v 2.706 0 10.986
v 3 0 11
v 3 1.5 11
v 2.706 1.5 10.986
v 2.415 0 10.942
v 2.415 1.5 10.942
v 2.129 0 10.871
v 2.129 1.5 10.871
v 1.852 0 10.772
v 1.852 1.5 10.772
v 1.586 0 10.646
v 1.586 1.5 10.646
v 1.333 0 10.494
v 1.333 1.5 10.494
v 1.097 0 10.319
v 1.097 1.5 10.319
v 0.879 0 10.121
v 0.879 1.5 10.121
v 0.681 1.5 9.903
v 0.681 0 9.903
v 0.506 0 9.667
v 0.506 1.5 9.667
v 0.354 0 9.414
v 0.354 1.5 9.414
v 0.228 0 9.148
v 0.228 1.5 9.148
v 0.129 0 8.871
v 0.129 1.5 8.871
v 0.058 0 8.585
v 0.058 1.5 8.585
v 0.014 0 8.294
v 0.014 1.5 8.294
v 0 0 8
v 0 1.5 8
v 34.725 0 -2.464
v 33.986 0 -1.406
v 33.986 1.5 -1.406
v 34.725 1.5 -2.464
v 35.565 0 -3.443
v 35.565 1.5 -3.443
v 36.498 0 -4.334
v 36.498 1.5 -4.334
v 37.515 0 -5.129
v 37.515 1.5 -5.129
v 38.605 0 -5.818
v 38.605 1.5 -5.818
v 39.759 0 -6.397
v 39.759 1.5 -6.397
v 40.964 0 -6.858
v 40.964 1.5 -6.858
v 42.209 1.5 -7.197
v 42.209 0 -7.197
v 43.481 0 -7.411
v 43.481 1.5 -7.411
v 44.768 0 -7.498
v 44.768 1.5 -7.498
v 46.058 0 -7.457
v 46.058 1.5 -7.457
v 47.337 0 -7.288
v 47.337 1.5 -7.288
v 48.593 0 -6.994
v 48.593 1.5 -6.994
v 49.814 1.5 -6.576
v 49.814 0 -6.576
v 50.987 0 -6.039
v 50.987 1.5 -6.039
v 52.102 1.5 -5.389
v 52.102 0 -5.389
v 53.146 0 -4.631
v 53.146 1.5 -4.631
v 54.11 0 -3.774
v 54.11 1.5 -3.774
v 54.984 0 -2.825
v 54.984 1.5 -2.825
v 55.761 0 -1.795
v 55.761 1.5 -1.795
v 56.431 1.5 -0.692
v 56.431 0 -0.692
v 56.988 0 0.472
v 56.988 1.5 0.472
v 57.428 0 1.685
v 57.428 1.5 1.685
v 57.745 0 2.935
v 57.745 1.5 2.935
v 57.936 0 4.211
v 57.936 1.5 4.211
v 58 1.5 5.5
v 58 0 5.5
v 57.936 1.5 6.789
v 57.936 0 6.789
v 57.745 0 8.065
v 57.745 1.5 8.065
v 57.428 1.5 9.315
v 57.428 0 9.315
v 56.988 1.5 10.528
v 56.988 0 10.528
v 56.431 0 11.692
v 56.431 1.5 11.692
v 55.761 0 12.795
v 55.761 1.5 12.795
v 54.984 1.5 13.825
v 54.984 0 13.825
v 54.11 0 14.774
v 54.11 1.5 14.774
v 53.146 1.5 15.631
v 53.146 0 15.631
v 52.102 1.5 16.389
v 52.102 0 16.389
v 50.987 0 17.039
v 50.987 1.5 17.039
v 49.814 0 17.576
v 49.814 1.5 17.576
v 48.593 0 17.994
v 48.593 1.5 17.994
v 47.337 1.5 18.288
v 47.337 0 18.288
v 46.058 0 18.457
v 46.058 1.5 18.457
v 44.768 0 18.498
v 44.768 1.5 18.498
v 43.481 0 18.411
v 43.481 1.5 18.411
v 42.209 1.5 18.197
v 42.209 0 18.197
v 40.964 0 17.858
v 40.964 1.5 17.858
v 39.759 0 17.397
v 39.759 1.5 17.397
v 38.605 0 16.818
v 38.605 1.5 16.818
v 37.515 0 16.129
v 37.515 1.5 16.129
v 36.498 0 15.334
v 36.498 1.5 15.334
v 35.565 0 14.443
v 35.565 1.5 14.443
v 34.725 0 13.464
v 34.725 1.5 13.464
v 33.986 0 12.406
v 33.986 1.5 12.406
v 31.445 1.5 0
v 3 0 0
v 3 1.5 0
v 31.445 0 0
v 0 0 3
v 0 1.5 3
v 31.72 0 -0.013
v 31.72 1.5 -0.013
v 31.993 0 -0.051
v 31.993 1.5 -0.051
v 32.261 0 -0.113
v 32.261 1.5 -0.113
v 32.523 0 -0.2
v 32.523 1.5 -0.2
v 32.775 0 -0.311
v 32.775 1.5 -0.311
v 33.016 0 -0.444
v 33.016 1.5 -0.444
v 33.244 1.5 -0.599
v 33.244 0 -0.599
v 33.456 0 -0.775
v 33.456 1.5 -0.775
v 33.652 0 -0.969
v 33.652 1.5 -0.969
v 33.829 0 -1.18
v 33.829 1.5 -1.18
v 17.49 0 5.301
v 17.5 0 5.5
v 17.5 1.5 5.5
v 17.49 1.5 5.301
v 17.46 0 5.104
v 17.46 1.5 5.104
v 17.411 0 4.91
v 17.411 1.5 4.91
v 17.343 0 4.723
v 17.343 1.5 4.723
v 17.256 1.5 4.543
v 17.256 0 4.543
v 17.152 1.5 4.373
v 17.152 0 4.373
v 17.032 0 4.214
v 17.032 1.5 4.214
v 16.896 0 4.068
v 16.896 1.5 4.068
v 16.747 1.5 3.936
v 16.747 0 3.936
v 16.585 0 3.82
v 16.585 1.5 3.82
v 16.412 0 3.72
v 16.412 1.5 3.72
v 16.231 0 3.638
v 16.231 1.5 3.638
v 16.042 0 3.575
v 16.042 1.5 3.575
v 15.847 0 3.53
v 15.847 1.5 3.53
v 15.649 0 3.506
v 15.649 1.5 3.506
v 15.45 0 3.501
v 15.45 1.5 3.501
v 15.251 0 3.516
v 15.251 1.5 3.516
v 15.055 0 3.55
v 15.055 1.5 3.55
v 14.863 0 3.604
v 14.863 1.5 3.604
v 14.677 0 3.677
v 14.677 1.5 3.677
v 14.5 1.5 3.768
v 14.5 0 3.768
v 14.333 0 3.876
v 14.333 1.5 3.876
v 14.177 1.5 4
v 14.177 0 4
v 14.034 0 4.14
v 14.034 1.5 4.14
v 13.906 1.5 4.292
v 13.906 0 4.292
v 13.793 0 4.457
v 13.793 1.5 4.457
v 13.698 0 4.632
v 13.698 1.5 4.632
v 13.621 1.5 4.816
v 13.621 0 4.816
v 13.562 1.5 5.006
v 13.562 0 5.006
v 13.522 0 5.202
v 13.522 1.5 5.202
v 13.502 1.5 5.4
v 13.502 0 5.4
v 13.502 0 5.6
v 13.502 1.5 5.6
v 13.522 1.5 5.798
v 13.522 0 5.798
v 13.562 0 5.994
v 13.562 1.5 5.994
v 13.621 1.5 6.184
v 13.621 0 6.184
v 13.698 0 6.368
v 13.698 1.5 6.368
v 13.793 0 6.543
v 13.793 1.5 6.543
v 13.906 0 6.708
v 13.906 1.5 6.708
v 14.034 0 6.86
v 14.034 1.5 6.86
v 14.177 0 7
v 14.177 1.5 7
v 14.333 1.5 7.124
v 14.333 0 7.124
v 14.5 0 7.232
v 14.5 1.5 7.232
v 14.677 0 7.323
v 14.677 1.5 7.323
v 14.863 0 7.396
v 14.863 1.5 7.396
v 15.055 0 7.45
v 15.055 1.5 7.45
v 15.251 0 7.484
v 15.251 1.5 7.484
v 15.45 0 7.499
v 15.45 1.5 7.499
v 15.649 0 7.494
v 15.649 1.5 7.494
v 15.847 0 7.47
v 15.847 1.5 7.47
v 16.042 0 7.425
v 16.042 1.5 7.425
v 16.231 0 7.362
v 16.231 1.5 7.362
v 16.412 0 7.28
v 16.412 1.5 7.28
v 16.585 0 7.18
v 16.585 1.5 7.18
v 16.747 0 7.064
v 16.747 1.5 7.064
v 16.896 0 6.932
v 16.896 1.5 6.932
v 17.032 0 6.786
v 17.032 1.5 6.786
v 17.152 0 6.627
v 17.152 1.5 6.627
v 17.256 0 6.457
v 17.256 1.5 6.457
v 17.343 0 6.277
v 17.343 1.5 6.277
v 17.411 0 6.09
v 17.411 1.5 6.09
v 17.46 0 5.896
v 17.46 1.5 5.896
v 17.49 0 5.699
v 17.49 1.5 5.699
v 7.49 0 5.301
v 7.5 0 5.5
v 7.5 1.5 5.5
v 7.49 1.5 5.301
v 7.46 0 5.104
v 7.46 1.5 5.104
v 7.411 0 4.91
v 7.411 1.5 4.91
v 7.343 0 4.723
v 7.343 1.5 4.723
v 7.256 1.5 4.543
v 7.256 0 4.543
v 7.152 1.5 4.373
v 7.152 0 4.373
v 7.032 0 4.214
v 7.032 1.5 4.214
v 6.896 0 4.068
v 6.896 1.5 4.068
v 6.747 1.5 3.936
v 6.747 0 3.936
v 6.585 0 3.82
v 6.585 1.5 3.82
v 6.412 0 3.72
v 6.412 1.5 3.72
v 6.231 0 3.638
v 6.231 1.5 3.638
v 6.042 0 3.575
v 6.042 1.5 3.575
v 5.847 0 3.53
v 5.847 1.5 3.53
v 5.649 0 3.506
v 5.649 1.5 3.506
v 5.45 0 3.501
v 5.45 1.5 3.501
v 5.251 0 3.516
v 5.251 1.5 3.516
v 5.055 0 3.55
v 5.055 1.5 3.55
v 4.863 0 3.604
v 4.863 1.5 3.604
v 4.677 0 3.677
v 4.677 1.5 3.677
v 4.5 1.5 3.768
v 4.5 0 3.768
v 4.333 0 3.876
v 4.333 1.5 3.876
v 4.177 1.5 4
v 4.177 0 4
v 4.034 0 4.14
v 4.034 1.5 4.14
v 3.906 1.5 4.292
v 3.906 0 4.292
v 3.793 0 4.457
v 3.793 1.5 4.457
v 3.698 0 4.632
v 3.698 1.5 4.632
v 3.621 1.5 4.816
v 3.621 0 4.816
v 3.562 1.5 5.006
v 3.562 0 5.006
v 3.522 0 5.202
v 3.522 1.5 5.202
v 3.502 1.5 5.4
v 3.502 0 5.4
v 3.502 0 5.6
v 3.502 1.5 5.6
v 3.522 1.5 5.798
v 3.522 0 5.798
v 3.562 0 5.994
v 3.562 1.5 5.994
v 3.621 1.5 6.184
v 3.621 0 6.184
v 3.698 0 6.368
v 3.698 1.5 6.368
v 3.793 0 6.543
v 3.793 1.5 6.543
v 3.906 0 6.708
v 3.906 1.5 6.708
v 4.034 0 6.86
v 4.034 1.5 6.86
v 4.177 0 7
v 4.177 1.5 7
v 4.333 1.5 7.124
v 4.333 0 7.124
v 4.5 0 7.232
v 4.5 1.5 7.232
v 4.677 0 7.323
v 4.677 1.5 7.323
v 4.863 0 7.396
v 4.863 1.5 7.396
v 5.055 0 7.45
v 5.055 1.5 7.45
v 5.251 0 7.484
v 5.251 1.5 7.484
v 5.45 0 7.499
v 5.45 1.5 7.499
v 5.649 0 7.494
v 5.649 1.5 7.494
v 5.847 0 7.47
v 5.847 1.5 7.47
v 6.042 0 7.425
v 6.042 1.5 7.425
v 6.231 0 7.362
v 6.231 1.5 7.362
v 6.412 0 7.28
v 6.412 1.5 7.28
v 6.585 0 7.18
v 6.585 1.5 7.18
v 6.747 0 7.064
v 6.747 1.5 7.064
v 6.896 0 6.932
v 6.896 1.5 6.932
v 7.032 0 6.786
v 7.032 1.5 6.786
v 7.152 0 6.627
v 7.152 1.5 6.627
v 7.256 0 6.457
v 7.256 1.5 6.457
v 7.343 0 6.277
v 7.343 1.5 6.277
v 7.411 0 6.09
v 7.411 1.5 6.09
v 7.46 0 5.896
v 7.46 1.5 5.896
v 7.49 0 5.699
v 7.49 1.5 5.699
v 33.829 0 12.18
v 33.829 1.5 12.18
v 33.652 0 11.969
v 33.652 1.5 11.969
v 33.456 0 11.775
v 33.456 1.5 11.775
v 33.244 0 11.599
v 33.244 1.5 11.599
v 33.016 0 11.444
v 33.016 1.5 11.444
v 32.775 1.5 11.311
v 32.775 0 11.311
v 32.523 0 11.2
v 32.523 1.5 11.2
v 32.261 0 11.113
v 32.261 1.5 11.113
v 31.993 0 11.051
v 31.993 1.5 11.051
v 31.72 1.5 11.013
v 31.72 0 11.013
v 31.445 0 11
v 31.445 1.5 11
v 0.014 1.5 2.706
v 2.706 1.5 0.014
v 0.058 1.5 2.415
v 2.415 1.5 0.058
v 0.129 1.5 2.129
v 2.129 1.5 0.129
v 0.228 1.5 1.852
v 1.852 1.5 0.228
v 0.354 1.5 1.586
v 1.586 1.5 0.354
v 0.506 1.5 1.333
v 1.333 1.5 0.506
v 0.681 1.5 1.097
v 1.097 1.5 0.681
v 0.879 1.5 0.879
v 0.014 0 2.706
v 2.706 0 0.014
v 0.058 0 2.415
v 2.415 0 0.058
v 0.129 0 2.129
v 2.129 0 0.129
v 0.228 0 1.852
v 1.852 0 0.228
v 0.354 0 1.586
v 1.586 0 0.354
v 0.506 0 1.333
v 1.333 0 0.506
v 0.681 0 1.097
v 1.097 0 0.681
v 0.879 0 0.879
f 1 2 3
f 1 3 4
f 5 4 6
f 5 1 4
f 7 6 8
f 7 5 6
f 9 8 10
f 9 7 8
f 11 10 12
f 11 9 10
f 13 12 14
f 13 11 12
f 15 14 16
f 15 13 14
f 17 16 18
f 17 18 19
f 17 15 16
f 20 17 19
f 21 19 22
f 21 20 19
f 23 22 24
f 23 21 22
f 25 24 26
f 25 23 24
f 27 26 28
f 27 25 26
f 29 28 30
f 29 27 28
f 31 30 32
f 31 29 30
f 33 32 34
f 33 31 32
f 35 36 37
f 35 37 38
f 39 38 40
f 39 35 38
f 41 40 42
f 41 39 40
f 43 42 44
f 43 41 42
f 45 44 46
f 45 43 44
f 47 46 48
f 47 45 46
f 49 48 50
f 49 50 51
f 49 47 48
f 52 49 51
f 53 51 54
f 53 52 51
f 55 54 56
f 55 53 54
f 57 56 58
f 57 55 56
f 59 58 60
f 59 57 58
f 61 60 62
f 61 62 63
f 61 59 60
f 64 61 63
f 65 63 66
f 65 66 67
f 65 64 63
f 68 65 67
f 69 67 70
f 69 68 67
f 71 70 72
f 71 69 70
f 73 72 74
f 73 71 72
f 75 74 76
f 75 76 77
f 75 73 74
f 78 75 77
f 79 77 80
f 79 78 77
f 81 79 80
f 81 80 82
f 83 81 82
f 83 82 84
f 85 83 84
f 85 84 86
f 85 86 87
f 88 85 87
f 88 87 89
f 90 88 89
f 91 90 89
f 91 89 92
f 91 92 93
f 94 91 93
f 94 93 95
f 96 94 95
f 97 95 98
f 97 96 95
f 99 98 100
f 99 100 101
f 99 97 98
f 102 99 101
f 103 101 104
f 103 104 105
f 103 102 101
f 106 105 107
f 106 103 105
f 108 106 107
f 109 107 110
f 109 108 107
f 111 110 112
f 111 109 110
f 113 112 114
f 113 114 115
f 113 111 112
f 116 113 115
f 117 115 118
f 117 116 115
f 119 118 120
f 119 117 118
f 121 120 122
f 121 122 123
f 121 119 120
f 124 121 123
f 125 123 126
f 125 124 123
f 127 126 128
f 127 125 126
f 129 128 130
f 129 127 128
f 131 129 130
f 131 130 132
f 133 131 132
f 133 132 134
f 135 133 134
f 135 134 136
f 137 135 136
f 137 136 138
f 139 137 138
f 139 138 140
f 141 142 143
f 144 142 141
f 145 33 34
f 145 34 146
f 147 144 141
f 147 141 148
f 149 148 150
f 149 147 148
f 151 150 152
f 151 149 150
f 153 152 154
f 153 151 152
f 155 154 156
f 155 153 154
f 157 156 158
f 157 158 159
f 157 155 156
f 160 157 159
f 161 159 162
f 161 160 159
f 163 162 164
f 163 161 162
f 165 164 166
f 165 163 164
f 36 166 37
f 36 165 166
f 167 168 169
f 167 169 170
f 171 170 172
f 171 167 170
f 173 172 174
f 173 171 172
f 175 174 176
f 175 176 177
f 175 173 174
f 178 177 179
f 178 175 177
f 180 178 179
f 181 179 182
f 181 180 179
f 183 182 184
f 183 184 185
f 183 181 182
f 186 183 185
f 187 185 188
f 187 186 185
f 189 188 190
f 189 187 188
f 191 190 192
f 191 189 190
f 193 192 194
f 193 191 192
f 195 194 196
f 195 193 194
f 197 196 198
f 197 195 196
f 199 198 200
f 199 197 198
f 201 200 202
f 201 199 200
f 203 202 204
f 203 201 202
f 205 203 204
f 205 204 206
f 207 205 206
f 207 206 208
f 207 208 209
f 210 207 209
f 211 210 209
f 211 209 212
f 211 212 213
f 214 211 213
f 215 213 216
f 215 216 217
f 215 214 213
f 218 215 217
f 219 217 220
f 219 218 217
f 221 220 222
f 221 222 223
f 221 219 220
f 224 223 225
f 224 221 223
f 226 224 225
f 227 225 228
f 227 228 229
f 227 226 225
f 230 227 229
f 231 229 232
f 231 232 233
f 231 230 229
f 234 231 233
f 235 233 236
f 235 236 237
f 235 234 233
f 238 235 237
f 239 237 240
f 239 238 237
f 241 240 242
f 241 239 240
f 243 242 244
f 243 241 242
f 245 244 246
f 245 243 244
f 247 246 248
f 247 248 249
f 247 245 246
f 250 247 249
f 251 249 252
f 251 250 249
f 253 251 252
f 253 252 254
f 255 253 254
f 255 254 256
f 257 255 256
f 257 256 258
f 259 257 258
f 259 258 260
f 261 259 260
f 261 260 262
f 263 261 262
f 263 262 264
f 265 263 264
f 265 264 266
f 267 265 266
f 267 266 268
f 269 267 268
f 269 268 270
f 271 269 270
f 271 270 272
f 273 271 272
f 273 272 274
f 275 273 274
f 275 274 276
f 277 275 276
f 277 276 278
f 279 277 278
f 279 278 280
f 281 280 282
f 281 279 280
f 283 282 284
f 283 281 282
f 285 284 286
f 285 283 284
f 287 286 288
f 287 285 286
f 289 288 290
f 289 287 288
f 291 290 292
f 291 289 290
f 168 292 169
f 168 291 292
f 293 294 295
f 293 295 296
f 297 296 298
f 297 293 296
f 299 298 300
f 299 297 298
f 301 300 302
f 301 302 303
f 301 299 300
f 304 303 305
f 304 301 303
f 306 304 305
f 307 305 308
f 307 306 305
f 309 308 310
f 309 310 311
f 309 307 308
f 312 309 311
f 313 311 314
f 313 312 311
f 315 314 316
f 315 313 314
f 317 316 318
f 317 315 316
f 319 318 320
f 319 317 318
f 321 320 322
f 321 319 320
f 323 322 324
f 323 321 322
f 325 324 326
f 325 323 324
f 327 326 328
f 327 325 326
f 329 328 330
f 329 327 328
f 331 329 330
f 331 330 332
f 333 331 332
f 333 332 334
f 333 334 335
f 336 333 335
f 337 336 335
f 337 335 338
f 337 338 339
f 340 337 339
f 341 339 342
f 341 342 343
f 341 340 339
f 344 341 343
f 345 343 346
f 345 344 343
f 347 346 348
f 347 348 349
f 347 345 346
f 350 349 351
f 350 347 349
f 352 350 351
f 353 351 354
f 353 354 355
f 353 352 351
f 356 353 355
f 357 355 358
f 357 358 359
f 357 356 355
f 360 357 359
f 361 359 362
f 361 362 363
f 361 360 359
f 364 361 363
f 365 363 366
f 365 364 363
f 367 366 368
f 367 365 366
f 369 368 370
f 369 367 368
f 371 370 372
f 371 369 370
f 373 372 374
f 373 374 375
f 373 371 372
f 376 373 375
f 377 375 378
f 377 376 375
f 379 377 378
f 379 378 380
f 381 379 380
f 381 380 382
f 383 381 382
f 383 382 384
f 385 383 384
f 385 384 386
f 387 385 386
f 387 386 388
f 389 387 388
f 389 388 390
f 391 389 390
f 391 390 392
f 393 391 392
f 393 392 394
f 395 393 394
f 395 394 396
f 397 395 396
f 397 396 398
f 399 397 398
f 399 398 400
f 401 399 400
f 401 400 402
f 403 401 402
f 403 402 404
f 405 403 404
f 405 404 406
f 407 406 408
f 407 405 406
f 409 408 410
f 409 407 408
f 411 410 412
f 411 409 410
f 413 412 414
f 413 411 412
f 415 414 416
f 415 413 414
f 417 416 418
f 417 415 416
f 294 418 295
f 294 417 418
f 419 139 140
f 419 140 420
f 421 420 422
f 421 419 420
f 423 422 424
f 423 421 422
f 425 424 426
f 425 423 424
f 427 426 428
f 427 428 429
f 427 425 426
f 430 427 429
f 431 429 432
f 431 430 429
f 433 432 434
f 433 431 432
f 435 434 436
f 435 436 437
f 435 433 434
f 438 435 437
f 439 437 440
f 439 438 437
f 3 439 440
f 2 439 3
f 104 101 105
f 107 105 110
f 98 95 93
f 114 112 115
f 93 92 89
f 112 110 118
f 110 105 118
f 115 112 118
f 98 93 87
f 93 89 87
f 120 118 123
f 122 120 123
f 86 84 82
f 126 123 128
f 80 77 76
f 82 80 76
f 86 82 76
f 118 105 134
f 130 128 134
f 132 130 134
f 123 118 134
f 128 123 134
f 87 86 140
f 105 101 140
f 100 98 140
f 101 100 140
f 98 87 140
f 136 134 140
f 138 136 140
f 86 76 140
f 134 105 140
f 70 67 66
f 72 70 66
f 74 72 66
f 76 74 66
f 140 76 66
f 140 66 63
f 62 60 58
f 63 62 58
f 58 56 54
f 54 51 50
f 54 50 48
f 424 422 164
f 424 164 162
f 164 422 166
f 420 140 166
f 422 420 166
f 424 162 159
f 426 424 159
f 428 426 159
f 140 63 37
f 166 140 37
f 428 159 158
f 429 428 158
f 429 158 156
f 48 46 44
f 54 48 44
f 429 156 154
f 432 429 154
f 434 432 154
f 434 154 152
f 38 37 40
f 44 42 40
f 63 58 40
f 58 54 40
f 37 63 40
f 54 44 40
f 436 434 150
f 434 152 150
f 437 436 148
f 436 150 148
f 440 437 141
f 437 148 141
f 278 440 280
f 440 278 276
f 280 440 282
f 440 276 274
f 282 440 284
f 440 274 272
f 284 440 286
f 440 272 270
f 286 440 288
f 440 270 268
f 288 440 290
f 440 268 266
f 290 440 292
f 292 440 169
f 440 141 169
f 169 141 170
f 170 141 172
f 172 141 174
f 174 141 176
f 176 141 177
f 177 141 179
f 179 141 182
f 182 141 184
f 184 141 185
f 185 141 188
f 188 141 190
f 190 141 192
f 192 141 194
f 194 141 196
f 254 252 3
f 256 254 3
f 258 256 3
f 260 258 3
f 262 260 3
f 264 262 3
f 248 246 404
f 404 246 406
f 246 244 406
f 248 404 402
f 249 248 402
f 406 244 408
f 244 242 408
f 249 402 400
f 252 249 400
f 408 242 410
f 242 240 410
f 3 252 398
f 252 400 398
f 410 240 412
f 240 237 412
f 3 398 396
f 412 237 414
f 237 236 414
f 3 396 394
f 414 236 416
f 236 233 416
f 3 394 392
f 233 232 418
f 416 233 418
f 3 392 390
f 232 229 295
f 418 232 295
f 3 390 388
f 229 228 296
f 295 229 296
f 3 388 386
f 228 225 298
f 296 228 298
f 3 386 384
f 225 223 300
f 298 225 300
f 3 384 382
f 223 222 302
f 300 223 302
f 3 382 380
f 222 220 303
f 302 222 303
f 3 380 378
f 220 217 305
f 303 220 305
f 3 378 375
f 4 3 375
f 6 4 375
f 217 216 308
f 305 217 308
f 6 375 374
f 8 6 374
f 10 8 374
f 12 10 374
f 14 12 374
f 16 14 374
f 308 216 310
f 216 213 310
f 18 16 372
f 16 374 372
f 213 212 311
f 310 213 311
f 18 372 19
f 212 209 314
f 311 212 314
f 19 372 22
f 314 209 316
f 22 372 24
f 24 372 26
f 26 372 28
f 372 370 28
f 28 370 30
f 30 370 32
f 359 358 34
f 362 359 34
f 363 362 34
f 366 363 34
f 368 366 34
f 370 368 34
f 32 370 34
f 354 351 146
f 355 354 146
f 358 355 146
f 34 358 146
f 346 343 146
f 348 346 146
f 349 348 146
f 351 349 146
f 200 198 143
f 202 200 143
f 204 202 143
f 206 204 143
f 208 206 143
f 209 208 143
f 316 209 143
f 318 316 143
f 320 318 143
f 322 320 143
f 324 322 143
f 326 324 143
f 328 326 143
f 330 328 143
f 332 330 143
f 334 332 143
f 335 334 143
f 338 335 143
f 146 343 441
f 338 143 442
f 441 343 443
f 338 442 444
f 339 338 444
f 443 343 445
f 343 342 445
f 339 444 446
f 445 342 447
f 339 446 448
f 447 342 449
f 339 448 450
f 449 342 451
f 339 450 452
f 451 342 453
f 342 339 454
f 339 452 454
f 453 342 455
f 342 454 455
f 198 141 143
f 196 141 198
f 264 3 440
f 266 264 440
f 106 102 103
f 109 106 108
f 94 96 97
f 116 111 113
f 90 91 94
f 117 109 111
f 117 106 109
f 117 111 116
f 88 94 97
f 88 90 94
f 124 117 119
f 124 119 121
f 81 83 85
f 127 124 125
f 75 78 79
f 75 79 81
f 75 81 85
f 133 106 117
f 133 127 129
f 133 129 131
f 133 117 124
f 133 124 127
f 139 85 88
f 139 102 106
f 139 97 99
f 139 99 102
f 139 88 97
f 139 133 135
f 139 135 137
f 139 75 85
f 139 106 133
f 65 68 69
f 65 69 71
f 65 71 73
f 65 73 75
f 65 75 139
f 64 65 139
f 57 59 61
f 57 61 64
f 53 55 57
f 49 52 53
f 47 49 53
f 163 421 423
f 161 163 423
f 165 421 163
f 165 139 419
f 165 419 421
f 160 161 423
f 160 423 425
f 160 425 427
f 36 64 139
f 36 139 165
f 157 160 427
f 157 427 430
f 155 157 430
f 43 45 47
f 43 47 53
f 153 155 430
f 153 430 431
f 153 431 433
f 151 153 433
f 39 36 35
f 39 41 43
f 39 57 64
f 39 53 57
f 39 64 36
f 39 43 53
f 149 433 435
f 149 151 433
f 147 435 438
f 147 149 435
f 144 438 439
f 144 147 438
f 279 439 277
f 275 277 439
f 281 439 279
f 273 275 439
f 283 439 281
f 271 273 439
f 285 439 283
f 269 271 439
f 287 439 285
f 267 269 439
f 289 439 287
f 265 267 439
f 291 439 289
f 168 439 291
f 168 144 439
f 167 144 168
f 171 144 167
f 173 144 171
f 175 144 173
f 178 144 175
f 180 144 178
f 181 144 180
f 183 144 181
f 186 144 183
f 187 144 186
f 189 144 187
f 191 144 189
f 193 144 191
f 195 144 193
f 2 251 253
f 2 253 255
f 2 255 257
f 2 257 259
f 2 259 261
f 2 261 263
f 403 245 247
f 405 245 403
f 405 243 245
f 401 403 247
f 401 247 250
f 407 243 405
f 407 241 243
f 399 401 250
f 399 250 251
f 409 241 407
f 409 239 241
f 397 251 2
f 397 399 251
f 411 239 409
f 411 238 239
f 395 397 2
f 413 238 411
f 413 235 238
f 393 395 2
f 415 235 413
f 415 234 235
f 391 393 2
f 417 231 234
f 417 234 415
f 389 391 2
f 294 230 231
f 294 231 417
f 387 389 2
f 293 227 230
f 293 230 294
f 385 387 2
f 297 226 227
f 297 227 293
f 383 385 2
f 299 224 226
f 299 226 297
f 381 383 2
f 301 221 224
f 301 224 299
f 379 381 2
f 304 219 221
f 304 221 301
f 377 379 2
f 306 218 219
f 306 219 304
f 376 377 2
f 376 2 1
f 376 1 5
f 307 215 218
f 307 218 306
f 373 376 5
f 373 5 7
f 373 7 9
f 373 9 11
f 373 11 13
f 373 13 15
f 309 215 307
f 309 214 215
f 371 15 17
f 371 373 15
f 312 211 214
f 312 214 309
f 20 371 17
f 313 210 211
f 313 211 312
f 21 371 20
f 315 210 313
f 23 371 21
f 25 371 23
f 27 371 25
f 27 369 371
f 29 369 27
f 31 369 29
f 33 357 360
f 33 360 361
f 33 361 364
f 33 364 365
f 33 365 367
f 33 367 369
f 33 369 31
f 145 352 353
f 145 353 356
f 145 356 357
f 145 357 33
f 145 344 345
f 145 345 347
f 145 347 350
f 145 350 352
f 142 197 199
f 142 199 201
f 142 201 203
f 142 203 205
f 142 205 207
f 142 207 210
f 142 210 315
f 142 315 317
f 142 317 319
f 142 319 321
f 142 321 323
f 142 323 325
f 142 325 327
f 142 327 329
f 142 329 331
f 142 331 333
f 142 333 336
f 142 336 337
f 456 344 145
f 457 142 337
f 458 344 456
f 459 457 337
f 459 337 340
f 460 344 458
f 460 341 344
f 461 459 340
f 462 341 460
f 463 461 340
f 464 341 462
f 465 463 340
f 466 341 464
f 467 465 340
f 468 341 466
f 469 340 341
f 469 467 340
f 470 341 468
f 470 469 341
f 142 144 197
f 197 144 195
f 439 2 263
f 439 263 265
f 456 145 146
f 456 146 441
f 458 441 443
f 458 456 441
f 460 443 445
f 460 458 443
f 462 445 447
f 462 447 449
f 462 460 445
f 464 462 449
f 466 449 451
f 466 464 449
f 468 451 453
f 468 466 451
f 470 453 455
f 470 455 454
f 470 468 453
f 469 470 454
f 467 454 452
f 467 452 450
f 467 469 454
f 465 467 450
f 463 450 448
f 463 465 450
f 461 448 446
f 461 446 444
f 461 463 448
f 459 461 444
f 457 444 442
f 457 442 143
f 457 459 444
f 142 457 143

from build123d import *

# Parameters (mm, degrees)
SKETCH_1_R      = 2
EXTRUDE_1_DEPTH = 1.5


with BuildPart() as part:
    # Эскиз1 → Бобышка-Вытянуть1 (new body)
    with BuildSketch(Plane(origin=(0, 0, 0), x_dir=(1, 0, 0), z_dir=(0, 1, 0))):
        with BuildLine():
            Line((3, 0), (31.444558288, 0))
            ThreePointArc((31.444558288, 0), (32.896927043, 0.375), (33.986203609, 1.40625))
            ThreePointArc((33.986203609, 1.40625), (58, -5.5), (33.986203609, -12.40625))
            ThreePointArc((33.986203609, -12.40625), (32.896927043, -11.375), (31.444558288, -11))
            Line((31.444558288, -11), (3, -11))
            ThreePointArc((3, -11), (0.878679656, -10.121320344), (0, -8))
            Line((0, -8), (0, -3))
            ThreePointArc((0, -3), (0.878679656, -0.878679656), (3, 0))
        make_face()
        with Locations((5.5, -5.5)):
            Circle(SKETCH_1_R, mode=Mode.SUBTRACT)
        with Locations((15.5, -5.5)):
            Circle(SKETCH_1_R, mode=Mode.SUBTRACT)
    extrude(amount=EXTRUDE_1_DEPTH)


solid = part.part
